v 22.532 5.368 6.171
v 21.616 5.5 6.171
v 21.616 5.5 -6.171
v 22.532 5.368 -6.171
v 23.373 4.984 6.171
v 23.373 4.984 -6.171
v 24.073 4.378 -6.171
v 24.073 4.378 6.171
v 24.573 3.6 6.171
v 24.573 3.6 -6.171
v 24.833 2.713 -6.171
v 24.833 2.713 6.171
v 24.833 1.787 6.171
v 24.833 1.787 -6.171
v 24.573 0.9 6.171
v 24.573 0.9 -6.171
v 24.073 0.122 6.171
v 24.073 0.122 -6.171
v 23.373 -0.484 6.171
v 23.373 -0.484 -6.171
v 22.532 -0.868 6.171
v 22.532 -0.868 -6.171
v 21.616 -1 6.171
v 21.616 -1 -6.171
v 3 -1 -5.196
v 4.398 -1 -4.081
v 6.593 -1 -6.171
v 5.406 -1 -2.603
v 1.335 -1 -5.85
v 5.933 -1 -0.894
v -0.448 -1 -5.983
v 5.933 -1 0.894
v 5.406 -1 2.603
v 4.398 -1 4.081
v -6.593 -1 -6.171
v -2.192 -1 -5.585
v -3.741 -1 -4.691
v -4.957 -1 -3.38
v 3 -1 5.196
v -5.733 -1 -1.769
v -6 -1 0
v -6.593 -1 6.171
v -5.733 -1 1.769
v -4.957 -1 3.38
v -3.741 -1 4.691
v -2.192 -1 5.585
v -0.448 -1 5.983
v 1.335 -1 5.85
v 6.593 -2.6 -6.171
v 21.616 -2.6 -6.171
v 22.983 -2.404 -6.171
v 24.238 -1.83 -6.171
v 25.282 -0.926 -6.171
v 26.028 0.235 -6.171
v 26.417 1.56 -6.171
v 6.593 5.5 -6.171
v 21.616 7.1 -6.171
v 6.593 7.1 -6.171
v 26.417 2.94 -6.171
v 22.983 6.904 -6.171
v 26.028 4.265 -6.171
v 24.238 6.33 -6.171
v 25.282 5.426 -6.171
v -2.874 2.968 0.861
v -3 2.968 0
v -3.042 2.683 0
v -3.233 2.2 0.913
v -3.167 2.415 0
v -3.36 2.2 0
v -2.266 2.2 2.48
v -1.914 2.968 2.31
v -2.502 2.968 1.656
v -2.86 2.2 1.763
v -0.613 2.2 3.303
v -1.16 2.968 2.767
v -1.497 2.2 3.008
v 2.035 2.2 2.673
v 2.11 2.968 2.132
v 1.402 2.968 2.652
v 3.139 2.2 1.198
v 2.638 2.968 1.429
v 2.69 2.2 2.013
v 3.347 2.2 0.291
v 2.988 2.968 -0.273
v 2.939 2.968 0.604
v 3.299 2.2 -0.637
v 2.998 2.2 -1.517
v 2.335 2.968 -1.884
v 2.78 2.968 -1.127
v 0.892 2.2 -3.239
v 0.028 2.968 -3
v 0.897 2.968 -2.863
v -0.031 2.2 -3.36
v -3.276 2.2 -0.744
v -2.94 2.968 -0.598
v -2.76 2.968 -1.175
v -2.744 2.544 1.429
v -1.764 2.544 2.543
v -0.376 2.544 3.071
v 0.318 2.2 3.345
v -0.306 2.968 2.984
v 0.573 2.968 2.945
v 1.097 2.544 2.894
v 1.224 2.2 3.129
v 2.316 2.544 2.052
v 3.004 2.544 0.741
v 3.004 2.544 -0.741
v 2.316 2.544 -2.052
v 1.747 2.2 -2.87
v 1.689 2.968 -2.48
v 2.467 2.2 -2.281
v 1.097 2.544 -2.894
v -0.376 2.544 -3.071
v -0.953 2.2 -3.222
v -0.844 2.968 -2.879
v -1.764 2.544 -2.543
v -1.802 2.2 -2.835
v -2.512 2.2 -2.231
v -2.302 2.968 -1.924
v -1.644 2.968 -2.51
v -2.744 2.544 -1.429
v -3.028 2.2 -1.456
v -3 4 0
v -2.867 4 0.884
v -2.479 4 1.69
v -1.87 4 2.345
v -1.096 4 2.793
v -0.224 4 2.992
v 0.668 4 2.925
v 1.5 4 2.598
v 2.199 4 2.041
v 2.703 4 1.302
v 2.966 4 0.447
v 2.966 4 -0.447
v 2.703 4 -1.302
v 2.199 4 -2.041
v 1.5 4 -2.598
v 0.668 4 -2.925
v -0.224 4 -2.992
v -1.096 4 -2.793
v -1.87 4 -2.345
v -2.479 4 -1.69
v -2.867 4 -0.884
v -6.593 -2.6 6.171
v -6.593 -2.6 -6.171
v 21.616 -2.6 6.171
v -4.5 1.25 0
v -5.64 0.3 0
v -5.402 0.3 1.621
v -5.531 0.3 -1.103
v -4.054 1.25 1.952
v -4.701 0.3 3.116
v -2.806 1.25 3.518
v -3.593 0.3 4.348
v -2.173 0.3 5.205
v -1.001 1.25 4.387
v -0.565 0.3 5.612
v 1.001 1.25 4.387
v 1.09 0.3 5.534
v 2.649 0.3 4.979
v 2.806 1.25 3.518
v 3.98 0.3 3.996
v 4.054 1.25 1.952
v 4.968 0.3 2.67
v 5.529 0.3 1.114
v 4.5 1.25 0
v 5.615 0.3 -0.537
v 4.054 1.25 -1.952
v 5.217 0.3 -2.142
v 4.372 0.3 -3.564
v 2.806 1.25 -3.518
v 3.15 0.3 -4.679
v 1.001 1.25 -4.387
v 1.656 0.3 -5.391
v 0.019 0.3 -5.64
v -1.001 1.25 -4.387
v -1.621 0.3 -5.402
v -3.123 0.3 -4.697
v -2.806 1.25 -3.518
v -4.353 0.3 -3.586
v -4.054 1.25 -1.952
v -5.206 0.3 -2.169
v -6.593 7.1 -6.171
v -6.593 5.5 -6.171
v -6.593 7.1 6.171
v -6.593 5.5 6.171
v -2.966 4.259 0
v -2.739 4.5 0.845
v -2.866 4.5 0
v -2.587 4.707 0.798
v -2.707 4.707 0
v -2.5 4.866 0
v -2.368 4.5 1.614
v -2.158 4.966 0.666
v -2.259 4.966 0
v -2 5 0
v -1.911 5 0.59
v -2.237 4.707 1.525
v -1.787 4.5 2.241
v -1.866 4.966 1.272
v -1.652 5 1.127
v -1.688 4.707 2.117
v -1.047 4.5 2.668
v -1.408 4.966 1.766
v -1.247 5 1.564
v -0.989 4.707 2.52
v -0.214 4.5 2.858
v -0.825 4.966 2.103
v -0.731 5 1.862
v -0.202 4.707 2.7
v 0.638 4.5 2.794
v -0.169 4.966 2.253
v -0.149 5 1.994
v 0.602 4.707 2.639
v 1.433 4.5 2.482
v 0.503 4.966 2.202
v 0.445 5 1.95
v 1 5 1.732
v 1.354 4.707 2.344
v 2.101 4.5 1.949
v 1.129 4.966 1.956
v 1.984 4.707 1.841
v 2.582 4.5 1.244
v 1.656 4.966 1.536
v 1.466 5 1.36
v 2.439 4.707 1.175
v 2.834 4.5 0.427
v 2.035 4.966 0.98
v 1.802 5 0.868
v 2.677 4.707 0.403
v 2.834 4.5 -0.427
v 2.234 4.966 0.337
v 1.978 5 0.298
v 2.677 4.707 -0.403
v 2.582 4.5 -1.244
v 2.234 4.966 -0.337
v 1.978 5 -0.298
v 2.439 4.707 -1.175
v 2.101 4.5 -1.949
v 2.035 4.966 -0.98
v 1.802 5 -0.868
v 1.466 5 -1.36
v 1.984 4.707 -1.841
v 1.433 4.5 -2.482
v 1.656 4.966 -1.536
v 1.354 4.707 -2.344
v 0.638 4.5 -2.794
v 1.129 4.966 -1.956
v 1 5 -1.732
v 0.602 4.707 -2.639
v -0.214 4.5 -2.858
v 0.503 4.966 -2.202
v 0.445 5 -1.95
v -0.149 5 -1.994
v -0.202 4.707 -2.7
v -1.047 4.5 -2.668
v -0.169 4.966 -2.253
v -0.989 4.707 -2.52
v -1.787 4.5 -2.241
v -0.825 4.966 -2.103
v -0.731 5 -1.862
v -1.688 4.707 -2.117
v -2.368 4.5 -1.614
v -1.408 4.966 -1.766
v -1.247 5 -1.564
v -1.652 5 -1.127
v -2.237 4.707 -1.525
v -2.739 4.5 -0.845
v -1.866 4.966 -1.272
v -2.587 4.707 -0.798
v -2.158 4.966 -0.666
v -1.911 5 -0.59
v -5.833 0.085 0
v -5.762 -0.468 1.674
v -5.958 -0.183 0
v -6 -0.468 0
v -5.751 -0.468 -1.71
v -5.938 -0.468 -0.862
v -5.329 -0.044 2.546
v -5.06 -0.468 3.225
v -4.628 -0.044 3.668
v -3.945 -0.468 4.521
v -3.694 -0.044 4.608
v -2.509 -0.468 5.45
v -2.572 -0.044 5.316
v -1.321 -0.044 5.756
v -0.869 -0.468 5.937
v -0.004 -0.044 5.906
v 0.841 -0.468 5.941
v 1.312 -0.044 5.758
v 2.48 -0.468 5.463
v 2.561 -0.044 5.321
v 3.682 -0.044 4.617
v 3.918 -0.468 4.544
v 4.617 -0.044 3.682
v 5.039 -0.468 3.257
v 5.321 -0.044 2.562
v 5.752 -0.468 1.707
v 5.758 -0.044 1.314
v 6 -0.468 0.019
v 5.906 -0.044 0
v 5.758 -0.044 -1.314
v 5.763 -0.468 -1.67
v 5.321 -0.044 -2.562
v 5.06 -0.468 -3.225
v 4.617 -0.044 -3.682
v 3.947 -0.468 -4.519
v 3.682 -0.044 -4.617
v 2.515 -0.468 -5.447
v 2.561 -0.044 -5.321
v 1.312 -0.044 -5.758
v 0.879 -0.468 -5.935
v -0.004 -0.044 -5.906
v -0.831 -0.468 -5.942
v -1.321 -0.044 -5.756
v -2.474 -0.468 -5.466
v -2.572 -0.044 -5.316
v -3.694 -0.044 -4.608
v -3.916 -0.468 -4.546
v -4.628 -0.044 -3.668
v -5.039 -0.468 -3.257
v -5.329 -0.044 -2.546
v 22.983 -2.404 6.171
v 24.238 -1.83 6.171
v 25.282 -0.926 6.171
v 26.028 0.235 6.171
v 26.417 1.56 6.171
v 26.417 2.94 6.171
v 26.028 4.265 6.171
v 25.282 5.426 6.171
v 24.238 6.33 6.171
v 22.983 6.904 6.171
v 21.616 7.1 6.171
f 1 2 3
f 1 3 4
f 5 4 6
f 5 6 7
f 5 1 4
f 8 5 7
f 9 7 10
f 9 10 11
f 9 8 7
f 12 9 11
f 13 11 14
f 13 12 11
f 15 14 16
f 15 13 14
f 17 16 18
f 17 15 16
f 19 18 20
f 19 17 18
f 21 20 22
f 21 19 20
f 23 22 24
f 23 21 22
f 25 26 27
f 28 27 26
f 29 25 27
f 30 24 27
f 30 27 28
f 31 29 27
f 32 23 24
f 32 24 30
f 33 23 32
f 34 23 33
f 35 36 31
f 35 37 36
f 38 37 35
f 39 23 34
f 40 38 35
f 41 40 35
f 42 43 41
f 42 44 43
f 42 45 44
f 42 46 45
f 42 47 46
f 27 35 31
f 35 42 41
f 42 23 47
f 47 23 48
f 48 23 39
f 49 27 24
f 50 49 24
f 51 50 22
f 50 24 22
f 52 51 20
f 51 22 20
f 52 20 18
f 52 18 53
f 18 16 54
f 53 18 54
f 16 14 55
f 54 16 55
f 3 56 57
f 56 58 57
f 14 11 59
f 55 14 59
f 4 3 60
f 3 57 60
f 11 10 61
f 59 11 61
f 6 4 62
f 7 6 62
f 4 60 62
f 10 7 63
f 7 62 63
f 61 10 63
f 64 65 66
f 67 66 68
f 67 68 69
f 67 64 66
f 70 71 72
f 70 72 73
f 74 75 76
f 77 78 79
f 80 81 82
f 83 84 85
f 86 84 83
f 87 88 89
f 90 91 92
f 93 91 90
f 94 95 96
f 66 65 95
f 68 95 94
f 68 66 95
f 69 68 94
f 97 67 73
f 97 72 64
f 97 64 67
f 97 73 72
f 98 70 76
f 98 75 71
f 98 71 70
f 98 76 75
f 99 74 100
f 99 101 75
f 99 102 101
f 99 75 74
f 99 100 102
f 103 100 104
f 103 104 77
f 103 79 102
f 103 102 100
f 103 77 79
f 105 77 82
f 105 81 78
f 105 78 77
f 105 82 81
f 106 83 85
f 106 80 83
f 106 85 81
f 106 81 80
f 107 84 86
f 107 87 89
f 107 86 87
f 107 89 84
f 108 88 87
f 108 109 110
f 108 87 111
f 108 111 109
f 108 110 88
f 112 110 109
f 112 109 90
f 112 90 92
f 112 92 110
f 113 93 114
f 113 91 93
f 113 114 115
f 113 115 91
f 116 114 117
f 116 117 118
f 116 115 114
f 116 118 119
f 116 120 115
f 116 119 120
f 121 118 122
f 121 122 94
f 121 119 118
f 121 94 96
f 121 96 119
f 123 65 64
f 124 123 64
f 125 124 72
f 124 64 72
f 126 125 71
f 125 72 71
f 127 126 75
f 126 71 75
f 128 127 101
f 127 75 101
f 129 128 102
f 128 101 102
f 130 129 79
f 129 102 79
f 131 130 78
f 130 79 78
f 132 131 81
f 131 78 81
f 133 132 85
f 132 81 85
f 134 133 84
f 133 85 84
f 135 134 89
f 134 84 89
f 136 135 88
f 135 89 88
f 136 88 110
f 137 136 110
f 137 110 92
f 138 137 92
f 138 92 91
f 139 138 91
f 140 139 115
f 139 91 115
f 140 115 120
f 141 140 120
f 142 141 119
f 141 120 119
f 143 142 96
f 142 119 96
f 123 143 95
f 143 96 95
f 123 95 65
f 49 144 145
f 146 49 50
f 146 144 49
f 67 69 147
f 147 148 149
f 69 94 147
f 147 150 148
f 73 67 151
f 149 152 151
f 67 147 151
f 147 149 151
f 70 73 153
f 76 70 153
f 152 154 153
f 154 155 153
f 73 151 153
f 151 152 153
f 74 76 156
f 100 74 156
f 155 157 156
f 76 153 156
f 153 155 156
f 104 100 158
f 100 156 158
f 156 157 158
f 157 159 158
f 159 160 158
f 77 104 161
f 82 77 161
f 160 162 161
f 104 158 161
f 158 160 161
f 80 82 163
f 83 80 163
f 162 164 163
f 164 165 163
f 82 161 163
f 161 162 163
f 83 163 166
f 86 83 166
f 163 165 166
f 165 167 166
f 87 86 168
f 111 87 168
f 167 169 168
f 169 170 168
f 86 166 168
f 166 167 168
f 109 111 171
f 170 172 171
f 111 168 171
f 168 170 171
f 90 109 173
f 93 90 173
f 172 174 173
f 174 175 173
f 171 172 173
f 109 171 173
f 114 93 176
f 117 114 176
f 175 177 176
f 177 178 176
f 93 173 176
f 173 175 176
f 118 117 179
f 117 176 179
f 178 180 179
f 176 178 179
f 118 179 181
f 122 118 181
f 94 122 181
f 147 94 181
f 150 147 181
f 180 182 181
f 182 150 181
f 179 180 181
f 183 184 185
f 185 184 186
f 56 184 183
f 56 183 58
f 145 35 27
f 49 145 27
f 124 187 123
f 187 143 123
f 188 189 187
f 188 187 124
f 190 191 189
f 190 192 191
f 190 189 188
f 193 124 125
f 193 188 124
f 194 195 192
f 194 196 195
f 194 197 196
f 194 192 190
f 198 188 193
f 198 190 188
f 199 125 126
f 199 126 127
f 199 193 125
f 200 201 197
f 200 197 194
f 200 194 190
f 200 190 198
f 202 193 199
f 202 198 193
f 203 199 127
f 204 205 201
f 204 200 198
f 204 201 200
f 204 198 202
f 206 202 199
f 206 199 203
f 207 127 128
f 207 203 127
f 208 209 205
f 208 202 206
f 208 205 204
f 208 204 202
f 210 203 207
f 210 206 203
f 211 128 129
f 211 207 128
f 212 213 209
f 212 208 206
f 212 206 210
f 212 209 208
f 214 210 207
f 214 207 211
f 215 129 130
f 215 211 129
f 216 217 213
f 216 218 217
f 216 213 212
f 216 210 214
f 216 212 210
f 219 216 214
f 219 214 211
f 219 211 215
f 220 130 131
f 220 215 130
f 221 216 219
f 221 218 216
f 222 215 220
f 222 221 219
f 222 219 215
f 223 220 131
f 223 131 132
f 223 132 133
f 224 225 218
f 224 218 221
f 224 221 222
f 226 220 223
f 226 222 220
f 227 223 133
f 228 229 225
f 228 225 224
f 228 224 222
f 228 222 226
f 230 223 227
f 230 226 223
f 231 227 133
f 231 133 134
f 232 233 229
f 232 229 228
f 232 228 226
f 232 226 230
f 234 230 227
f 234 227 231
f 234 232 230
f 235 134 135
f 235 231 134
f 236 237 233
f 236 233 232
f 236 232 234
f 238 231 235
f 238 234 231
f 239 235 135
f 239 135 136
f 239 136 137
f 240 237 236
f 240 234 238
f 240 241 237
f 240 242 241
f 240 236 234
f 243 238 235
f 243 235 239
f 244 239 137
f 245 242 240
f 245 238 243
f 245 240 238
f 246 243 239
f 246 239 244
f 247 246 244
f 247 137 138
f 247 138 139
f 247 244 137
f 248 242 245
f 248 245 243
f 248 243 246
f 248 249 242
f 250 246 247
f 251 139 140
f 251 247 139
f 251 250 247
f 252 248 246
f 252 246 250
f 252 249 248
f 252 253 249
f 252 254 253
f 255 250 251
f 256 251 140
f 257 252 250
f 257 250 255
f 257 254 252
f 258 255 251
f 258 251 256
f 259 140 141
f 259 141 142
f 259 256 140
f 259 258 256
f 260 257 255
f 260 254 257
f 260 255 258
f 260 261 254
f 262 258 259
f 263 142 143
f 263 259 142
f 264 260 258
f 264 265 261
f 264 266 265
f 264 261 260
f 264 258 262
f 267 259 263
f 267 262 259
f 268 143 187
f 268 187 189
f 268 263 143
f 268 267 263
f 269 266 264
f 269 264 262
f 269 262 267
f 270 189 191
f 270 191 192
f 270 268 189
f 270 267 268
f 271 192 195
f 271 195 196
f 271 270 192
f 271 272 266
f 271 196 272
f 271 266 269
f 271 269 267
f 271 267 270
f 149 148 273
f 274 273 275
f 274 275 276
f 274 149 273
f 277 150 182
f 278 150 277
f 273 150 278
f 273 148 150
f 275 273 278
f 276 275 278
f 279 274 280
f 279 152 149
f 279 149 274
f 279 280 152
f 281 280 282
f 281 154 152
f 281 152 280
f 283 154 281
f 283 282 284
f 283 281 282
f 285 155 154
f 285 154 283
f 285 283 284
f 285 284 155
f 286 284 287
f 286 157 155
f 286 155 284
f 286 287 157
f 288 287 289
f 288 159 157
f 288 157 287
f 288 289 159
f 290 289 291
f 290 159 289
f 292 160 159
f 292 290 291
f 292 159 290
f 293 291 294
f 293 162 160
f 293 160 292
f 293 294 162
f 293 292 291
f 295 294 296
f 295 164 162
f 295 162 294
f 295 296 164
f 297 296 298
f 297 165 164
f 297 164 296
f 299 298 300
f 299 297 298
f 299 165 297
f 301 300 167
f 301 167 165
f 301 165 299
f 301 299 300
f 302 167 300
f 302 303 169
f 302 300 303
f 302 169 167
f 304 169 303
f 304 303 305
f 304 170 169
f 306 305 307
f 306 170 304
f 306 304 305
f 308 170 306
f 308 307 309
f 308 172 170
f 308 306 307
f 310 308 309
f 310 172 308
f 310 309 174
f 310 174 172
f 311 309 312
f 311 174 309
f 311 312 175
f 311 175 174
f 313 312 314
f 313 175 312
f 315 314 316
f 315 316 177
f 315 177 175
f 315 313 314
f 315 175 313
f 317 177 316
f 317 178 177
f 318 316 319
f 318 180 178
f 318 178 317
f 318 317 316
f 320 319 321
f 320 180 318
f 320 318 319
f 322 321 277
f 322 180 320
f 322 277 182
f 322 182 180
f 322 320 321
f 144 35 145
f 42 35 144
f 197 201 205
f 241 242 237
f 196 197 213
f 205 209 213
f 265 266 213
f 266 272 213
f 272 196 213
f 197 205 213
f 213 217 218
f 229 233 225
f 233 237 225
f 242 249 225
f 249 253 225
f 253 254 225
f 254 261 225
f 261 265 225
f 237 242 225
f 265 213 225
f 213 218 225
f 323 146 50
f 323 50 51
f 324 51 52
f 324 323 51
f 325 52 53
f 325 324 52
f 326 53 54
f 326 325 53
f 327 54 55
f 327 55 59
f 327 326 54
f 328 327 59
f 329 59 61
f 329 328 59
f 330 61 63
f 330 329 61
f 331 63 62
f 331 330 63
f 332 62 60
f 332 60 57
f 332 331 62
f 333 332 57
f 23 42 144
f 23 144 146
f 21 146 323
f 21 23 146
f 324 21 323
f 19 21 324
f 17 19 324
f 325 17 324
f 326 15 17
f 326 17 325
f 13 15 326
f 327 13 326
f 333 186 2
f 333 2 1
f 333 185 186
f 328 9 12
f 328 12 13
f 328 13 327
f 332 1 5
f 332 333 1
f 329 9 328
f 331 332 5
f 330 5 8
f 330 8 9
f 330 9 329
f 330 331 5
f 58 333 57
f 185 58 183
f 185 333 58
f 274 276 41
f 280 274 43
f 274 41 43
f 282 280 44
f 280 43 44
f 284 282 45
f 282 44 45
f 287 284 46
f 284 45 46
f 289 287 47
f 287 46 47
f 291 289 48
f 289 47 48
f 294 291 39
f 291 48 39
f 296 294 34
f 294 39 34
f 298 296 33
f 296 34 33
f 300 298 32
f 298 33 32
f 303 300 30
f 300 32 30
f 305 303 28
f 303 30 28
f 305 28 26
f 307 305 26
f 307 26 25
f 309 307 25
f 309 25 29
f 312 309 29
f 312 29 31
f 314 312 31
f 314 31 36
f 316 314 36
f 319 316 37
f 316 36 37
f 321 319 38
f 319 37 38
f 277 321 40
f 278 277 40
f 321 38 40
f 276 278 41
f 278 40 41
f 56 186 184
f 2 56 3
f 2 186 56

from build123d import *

# Parameters (mm, degrees)
FILLET1_R           = 1
SKETCH2_W           = 13.18647025
SKETCH2_H           = 12.34139231
BOSS_EXTRUDE1_DEPTH = 1.6
BOSS_EXTRUDE2_START = -6.5
SKETCH2_2_W         = 13.18647025
SKETCH2_2_H         = 12.34139231
BOSS_EXTRUDE2_DEPTH = 1.6
BOSS_EXTRUDE3_DEPTH = 12.341392


with BuildPart() as part:
    # Sketch1 → Revolve1 (revolve)
    with BuildSketch(Plane.XY):
        Polygon((-3, 5), (-3, 2.5), (-6, 0), (-6, -1), (0, -1), (0, 5), align=None)
    revolve(axis=Axis((0, -1, 0), (0, 1, 0)))

    # Fillet1
    fillet1_edges = [part.edges().sort_by_distance(p)[0] for p in [
        (3, 5, 0),
        (6, 0, 0),
        (3, 2.5, 0),
    ]]
    fillet(fillet1_edges, radius=FILLET1_R)

    # Sketch2 → Boss-Extrude1 (add)
    with BuildSketch(Plane.XZ.offset(1)):
        Rectangle(SKETCH2_W, SKETCH2_H)
    extrude(amount=BOSS_EXTRUDE1_DEPTH)



with BuildPart() as body_2:
    # Sketch2<2> → Boss-Extrude2 (new body)
    with BuildSketch(Plane.XZ.offset(1).offset(BOSS_EXTRUDE2_START)):
        Rectangle(SKETCH2_2_W, SKETCH2_2_H)
    extrude(amount=-BOSS_EXTRUDE2_DEPTH)


with BuildPart() as part_1:
    add(part.part)

    add(body_2.part)  # Boss-Extrude3 merges body 2
    # Sketch4 → Boss-Extrude3 (add)
    with BuildSketch(Plane.XY.offset(6.170696155)):
        with BuildLine():
            Line((6.593235125, 5.5), (21.616366257, 5.5))
            ThreePointArc((21.616366257, 5.5), (24.866366257, 2.25), (21.616366257, -1))
            Line((21.616366257, -1), (6.593235125, -1))
            Line((6.593235125, -1), (6.593235125, -2.6))
            Line((6.593235125, -2.6), (21.616366257, -2.6))
            ThreePointArc((21.616366257, -2.6), (26.466366257, 2.25), (21.616366257, 7.1))
            Line((21.616366257, 7.1), (6.593235125, 7.1))
            Line((6.593235125, 7.1), (6.593235125, 5.5))
        make_face()
    extrude(amount=-BOSS_EXTRUDE3_DEPTH)


solid = part_1.part
